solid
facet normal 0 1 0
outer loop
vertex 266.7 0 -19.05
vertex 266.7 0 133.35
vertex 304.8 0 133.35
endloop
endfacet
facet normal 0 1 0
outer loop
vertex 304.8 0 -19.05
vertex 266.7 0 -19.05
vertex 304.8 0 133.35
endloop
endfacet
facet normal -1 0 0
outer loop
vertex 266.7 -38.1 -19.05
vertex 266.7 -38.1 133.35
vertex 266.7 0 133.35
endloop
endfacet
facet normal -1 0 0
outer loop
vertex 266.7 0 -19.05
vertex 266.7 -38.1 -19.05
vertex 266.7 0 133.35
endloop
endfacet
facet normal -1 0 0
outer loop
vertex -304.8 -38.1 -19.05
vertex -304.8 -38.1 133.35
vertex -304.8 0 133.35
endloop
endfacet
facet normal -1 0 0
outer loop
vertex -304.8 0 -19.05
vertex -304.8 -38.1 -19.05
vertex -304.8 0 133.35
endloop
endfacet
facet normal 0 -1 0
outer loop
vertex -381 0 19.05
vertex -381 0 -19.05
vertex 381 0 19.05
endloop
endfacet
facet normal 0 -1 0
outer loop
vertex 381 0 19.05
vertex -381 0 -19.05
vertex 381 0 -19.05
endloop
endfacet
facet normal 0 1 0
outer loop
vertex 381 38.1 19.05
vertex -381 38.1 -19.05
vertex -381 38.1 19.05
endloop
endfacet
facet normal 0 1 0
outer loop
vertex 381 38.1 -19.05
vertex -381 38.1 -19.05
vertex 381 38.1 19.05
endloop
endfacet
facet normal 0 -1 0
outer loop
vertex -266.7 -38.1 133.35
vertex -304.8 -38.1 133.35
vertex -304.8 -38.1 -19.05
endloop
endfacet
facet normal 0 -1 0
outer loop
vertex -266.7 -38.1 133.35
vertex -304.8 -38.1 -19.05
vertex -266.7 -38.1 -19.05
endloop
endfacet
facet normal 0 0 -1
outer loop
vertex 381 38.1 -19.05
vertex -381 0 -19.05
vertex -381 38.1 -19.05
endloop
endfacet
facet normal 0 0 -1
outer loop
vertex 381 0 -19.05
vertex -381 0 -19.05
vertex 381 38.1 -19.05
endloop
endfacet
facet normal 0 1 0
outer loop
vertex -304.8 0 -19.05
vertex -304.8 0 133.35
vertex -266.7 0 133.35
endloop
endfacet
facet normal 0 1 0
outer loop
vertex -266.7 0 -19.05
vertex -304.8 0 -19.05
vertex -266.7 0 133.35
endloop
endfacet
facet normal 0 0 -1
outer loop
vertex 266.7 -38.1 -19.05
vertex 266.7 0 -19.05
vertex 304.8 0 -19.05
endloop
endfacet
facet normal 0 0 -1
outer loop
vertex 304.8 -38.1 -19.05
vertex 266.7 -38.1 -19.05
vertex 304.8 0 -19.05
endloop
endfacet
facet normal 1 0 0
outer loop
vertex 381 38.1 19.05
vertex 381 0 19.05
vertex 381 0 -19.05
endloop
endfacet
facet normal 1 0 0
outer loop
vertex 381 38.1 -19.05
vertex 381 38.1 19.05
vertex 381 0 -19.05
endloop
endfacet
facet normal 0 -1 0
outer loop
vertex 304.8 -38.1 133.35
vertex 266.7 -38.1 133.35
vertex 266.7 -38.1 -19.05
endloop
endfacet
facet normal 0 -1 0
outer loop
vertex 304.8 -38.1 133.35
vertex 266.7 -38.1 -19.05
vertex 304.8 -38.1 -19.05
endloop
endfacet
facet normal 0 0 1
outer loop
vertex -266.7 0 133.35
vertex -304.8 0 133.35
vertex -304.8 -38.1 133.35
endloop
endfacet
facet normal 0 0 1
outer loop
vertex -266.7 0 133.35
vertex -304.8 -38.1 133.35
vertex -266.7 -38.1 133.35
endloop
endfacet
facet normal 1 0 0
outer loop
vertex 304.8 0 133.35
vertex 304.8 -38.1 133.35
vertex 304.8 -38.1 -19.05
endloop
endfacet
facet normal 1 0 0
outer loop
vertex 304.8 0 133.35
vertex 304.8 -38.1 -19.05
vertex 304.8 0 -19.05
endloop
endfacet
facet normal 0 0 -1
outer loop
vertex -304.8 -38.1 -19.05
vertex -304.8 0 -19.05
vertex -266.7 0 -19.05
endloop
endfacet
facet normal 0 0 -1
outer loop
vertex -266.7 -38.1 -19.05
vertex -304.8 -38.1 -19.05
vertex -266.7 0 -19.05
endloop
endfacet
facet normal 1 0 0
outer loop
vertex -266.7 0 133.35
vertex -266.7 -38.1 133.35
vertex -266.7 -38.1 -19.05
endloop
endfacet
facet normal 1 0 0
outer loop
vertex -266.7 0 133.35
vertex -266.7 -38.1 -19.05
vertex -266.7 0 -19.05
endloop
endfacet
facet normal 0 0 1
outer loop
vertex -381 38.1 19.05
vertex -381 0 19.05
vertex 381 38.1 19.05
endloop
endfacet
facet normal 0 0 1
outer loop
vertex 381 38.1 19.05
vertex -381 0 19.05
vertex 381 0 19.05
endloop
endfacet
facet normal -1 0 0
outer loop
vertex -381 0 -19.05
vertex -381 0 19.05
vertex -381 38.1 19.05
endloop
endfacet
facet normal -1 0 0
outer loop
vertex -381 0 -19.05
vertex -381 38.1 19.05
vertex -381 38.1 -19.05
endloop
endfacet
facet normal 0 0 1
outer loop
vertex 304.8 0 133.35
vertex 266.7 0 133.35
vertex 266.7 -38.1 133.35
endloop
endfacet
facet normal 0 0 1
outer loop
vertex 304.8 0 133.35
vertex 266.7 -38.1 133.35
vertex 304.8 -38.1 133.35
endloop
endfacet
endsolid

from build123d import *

# Parameters (mm, degrees)
SKETCH5_W             = 762
SKETCH5_H             = 38.1
BOSS_EXTRUDE3_DEPTH   = 38.1
SKETCH4_W             = 38.1
SKETCH4_H             = 38.1
BOSS_EXTRUDE4_DEPTH   = 152.4
BOSS_EXTRUDE4_2_DEPTH = 152.4


with BuildPart() as part:
    # Sketch5 → Boss-Extrude3 (new body)
    with BuildSketch(Plane(origin=(0, 0, 0), x_dir=(1, 0, 0), z_dir=(0, 1, 0))):
        Rectangle(SKETCH5_W, SKETCH5_H)
    extrude(amount=BOSS_EXTRUDE3_DEPTH)


with BuildPart() as body_2:
    # Sketch4 → Boss-Extrude4 (new body)
    with BuildSketch(Plane.XY.offset(-19.05)):
        with Locations((285.75, -19.05)):
            Rectangle(SKETCH4_W, SKETCH4_H)
    extrude(amount=BOSS_EXTRUDE4_DEPTH)


with BuildPart() as body_3:
    # Sketch4 → Boss-Extrude4 2 (new body)
    with BuildSketch(Plane.XY.offset(-19.05)):
        with Locations((-285.75, -19.05)):
            Rectangle(SKETCH4_W, SKETCH4_H)
    extrude(amount=BOSS_EXTRUDE4_2_DEPTH)


solid = Compound([part.part, body_2.part, body_3.part])
